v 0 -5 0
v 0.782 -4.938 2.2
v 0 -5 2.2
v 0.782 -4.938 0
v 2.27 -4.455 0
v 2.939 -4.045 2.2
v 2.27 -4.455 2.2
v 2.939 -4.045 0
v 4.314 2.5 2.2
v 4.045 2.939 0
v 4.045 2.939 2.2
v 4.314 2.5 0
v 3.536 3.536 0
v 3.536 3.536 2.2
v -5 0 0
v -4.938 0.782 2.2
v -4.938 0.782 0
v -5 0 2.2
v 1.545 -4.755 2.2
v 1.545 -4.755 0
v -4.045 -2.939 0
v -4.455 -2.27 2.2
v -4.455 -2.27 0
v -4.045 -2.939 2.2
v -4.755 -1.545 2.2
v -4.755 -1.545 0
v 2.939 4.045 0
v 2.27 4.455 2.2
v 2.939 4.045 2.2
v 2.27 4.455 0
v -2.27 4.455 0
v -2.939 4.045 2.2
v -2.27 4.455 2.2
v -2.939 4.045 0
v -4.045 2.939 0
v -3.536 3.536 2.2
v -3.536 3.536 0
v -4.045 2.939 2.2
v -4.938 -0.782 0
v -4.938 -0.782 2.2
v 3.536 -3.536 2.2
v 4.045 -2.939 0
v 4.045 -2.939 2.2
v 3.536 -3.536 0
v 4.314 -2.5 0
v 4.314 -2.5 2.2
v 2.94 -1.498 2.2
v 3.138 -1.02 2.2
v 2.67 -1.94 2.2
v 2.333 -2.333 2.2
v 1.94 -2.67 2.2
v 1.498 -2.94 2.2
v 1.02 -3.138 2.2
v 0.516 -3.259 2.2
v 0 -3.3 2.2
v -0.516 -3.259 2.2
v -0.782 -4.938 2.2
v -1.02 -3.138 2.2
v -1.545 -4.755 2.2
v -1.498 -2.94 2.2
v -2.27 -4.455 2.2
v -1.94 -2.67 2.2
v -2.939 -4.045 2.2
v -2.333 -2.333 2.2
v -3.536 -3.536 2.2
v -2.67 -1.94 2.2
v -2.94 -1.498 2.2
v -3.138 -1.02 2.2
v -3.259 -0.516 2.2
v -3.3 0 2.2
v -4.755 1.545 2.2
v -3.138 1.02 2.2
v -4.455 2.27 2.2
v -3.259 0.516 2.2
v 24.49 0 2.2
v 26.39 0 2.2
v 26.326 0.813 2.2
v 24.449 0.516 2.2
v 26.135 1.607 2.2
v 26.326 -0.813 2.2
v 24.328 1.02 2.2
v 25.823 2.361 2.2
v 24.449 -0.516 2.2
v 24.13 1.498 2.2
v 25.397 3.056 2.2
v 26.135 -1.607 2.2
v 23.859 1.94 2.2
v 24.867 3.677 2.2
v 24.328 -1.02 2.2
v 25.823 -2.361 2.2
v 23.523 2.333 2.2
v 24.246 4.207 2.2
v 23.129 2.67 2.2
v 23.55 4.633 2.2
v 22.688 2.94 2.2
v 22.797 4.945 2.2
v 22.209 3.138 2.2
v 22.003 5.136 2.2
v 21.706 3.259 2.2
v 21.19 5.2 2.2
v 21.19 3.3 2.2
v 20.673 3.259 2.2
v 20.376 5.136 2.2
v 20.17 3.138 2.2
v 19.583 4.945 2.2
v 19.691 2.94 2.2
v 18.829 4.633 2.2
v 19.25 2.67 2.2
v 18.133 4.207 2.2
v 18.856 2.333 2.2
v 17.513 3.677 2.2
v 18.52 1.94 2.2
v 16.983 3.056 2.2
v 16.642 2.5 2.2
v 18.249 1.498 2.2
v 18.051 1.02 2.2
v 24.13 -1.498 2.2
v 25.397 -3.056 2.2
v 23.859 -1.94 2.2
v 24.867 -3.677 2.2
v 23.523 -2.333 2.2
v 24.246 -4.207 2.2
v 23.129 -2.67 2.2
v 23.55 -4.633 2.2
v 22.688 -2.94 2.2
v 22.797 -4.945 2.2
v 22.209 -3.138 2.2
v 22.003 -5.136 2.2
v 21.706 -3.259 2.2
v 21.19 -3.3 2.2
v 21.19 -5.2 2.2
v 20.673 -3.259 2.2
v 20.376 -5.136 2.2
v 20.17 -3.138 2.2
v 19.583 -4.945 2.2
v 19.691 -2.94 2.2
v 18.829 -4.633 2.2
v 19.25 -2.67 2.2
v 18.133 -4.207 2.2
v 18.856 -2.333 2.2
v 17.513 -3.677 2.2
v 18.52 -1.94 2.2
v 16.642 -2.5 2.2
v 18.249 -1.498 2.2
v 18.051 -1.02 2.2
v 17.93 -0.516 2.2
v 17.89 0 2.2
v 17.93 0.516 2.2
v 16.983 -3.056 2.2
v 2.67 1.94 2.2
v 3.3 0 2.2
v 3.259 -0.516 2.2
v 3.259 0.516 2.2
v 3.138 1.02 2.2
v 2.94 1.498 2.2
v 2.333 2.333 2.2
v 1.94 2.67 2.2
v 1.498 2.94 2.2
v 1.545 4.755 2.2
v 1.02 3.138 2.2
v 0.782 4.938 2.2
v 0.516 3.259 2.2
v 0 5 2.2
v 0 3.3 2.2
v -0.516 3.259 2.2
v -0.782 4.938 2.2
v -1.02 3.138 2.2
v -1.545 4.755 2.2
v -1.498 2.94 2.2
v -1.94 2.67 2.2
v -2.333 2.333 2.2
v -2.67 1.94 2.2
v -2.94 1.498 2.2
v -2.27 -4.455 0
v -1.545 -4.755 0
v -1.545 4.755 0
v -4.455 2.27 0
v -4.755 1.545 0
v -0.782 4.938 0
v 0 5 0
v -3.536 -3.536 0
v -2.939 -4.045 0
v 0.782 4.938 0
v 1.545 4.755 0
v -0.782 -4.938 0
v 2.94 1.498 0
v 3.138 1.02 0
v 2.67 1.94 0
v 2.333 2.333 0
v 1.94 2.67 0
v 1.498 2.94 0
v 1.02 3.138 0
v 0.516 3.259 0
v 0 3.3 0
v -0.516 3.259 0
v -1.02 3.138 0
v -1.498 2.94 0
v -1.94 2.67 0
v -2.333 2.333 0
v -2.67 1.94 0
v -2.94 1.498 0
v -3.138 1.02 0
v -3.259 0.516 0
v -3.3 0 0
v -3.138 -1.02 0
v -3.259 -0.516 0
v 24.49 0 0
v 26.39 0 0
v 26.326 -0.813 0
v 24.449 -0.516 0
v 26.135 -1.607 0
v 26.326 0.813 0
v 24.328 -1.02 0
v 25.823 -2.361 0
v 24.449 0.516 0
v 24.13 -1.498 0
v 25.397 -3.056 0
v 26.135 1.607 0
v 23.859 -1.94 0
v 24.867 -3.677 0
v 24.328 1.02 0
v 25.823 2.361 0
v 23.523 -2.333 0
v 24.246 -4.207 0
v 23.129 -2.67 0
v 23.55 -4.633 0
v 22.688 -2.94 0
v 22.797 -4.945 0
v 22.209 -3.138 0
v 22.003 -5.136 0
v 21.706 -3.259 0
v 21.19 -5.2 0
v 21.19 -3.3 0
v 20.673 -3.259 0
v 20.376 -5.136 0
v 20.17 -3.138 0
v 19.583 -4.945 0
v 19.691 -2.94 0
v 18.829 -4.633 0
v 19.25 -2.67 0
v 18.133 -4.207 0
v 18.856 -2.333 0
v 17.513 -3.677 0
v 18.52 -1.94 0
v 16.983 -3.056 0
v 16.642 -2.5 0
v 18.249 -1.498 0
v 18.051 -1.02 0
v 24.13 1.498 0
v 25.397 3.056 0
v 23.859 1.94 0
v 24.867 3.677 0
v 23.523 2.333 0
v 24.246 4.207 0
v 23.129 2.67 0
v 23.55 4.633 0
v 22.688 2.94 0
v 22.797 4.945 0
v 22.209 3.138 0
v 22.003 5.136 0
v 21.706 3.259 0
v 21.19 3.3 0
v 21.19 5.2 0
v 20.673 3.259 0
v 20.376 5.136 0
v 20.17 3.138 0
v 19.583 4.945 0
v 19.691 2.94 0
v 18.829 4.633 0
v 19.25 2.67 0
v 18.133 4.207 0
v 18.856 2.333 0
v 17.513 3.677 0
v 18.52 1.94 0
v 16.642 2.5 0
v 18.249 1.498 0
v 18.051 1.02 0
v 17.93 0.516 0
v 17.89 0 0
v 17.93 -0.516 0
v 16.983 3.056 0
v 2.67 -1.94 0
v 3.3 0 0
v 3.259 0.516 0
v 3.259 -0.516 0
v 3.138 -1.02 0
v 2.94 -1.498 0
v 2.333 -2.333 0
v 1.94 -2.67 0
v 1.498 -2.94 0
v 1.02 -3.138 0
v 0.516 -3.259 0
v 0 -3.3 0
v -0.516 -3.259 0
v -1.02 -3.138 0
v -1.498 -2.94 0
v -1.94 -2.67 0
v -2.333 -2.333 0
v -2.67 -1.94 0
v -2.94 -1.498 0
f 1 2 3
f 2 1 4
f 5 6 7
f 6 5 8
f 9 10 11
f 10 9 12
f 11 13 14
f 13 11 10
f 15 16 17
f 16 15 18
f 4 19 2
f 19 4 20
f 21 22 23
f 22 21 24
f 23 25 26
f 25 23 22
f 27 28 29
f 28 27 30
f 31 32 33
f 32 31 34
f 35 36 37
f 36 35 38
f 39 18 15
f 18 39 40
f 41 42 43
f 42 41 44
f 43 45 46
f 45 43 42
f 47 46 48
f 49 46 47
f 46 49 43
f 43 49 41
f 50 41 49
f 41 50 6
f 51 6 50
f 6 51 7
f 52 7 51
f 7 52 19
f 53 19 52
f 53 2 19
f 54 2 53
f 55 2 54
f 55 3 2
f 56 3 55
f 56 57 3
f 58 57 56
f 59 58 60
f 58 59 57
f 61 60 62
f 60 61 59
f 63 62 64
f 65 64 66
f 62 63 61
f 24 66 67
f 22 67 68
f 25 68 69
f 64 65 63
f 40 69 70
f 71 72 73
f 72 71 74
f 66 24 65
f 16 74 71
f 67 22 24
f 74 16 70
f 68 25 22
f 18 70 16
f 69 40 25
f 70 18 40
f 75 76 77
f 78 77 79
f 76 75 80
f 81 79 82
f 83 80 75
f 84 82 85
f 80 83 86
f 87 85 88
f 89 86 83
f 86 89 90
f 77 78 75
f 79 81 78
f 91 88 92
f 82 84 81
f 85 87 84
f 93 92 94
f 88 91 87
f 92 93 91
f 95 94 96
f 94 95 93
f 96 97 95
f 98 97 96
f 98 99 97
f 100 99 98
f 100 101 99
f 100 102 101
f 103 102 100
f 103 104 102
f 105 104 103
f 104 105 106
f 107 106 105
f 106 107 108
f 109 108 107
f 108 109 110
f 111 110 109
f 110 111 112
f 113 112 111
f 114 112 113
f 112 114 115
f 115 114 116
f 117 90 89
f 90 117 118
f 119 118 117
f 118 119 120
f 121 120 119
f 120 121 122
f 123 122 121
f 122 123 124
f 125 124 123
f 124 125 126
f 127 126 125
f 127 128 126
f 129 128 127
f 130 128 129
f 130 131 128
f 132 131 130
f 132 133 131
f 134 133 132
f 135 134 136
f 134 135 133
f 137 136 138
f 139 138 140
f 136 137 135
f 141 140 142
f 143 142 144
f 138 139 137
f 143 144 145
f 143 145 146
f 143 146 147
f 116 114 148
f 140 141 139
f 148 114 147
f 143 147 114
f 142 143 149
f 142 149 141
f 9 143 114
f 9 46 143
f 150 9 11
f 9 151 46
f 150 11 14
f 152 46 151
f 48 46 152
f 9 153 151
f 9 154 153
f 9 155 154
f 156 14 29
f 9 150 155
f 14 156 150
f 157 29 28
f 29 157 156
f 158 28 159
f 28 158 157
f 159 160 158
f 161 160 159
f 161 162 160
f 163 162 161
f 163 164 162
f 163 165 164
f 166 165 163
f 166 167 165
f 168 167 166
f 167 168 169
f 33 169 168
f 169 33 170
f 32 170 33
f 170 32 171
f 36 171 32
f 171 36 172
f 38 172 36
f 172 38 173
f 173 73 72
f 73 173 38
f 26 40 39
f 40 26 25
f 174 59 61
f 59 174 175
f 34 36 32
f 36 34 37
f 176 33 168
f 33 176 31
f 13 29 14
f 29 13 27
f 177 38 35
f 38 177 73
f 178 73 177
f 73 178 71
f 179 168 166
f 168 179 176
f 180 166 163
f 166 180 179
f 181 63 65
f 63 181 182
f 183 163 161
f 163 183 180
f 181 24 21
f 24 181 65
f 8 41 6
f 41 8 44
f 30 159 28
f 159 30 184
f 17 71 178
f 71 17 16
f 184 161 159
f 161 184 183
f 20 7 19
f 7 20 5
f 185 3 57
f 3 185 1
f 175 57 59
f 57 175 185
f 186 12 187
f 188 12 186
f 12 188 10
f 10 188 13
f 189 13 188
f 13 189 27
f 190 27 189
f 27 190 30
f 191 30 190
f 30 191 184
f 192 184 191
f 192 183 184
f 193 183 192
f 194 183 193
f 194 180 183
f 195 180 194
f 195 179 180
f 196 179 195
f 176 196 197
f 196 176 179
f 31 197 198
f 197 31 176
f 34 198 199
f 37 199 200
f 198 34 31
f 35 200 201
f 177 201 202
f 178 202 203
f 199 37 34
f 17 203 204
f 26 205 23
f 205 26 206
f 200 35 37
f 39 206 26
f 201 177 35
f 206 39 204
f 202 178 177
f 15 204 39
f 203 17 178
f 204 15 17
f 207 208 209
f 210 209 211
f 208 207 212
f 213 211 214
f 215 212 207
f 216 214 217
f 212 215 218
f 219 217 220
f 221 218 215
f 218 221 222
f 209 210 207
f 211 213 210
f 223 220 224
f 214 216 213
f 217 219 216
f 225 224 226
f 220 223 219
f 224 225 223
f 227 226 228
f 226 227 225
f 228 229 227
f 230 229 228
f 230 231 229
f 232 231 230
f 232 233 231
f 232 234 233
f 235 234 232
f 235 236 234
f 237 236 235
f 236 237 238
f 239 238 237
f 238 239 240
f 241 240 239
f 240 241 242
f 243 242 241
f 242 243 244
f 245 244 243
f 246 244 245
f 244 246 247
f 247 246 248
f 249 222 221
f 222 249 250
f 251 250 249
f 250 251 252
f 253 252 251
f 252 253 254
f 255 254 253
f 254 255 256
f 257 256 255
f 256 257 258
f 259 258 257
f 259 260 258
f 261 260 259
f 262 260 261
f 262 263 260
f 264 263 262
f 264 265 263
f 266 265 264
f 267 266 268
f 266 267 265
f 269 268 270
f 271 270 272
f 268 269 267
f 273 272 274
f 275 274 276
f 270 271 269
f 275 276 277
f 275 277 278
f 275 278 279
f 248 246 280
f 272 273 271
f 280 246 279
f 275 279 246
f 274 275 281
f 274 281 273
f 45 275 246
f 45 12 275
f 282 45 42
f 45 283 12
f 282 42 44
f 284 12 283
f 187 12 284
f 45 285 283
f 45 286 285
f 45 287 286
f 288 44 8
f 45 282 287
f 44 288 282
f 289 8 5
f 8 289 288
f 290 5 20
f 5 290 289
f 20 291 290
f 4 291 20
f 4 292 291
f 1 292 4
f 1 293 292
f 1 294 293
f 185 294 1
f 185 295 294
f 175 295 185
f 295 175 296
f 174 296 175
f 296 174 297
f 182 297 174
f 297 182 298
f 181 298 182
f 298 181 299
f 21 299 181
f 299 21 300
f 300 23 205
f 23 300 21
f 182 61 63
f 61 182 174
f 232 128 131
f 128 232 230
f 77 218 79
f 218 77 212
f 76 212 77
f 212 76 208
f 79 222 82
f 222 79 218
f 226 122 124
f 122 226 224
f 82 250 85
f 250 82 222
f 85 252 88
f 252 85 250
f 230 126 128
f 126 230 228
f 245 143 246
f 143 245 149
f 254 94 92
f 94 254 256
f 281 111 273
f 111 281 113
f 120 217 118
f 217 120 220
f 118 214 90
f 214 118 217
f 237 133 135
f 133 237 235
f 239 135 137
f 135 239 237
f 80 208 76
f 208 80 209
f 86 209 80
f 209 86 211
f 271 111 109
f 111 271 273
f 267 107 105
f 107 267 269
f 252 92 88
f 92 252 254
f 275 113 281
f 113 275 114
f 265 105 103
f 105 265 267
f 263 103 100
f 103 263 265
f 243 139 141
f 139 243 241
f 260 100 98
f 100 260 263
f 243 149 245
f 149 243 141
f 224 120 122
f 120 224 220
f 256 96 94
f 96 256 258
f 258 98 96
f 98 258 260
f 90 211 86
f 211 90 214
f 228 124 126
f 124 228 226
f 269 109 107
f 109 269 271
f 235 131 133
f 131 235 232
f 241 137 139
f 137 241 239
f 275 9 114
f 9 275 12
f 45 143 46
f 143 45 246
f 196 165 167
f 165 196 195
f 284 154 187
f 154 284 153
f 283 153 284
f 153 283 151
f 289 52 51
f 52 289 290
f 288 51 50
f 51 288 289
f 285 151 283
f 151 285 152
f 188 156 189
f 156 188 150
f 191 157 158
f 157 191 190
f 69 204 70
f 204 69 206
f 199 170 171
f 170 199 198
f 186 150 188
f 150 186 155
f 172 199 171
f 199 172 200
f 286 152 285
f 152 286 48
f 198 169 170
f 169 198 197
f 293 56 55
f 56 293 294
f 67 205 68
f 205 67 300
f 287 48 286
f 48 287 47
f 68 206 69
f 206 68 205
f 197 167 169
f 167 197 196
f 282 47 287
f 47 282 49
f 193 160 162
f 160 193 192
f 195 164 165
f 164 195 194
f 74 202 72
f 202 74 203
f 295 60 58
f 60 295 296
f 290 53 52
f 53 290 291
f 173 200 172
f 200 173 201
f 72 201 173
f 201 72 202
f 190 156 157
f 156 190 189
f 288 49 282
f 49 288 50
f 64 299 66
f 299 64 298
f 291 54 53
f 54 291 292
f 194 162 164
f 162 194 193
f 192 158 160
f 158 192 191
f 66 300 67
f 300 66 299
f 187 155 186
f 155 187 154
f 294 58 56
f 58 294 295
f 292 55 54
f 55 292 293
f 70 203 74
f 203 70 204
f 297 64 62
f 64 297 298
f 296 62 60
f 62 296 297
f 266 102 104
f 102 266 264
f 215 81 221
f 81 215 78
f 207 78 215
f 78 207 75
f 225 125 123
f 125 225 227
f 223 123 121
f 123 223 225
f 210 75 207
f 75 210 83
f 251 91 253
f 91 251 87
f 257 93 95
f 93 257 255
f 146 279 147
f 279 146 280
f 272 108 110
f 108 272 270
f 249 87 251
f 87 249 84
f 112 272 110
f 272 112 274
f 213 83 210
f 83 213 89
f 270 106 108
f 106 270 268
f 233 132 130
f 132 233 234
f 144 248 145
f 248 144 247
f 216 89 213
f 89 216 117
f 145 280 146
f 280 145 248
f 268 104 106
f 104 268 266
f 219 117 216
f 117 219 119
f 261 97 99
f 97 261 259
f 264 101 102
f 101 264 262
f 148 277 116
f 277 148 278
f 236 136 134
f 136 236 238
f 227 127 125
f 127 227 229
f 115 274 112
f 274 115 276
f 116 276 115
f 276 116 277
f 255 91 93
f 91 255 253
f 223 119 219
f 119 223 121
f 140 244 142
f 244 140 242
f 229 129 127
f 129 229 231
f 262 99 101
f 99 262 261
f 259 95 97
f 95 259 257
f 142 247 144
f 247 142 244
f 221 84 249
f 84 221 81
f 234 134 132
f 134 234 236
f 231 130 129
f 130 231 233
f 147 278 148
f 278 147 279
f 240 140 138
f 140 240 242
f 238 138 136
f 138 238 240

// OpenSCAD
$fn=40;

gWT = 1.4;          // Wall thickness

Lift = 40;          // Amount the rows lift for each layer

// 8mm is the thinnest it can go or not enough room for hinges. This is
// enough for all except the first management row needs 11 mm.
CardThickness = 8;

PinDepth = 3.5;       // distance of Pins from edge
InOutPinDiff = Lift/2;  // From outgoing pin to incoming pin height
ConnLength  = sqrt((PinDepth*2)*(PinDepth*2) + InOutPinDiff*InOutPinDiff);

echo ("conn length = ",ConnLength);

CardStack = CardThickness+2*gWT;

if (CardStack < 10.4)
    echo(CardStack, "CARD THICKNESS TOO SMALL FOR HINGES");


// with sleeves and walls
CardW = 61+2*gWT;
CardH = 96;

CardsPerRow = 4;



module RCube(x,y,z,ipR=4) {
    translate([-x/2,-y/2,0]) hull(){
      translate([ipR,ipR,ipR]) sphere(ipR);
      translate([x-ipR,ipR,ipR]) sphere(ipR);
      translate([ipR,y-ipR,ipR]) sphere(ipR);
      translate([x-ipR,y-ipR,ipR]) sphere(ipR);
      translate([ipR,ipR,z-ipR]) sphere(ipR);
      translate([x-ipR,ipR,z-ipR]) sphere(ipR);
      translate([ipR,y-ipR,z-ipR]) sphere(ipR);
      translate([x-ipR,y-ipR,z-ipR]) sphere(ipR);
      }  
} 

module pin(h=10, r=4, lh=3, lt=1) {
  // h = shaft height
  // r = shaft radius
  // lh = lip height
  // lt = lip thickness

  difference() {
      union() {
        // shaft
        cylinder(h=h-lh, r=r, $fn=30);
        translate([0, 0, h-lh]) cylinder(h=lh*0.25, r1=r, r2=r+(lt/2), $fn=30);
        translate([0, 0, h-lh+lh*0.25]) cylinder(h=lh*0.25, r=r+(lt/2), $fn=30);    
        translate([0, 0, h-lh+lh*0.50]) cylinder(h=lh*0.50, r1=r+(lt/2), r2=r-(lt/2), $fn=30);    
      }
    
    // center cut
    translate([-r*0.5/2, -(r*2+lt*2)/2, h/4]) cube([r*0.5, r*2+lt*2, h]);
    translate([0, 0, h/4]) cylinder(h=h+lh, r=r/2.5, $fn=20);
  
    // side cuts
    translate([-r*2, -lt-r*1.125, -1]) cube([r*4, lt*2, h+2]);
    translate([-r*2, -lt+r*1.125, -1]) cube([r*4, lt*2, h+2]);
  }
}

module connector(){
    ConnThick = 2.2;
    
    difference(){
        union() {
           cylinder(r1=5,r2=5,h=ConnThick);
           translate([ConnLength,0,0]) cylinder(r1=5.2,r2=5.2,   h=ConnThick);
           translate([ConnLength/2,0,ConnThick/2])cube([ConnLength,5,ConnThick],center=true);
        }
        
       // drill the 2 holes (was 3.4 trying 3.3)
       translate([0,0,1])          cylinder(h=4, r=3.3, center =true);
       translate([ConnLength,0,1]) cylinder(h=4, r=3.3, center =true);
    }

}

module CardBox (width,thick,height){ 
      difference() {
        // create base box and hallow it out
        cube ([width,thick,height], center=true);
        translate([0,0,gWT]) cube ([width-2*gWT,thick-2*gWT,height], center=true);

        // Top access to grab card
        translate([0,0,height/2-20]) RCube(width-10,100,100,15); 
        
         // Access to see Milstone text, 2 strectched cylinders hulled
        hull(){
            translate([0,10,5]) scale([1,1,0.7])
                 rotate([90,0,0])cylinder(h=40,r=(width/2)-10,center=true);
            translate([0,10,-30]) scale([1,1,0.5])
                 rotate([90,0,0])cylinder(h=40,r=(width/2)-10,center=true);
        }
        
    }
}

module CardRow(Type="Middle")
{
    TopPinOffset = 6;   // top pin from top edge
    BotPinOffset = 6;   // bottom pin from bottom edge
    // middle pin is always from center

    difference(){
        union(){
           for (slot=[0:CardsPerRow-1])
               translate([CardW/2+CardW*slot-(gWT/2)*slot,0,0]) CardBox(CardW,CardStack,CardH);  
        }        
    }
    
    // Outgoing Pins for next row  Not needed for last row
    if (Type != "Last"){
        // TopOutPinLeft   10 mm from top , 5 mm from edge
        translate([CardW*CardsPerRow-(gWT/2)*(CardsPerRow-1),-CardStack/2 + PinDepth,CardH/2-TopPinOffset])rotate([90,0,90])
              pin(h=5, r=3, lh=3, lt=1);
        // MidOutPinLeft middle line so raise by half of InOutPinDiff
        translate([CardW*CardsPerRow-(gWT/2)*(CardsPerRow-1),-CardStack/2 + PinDepth, InOutPinDiff/2])rotate([90,0,90])
              pin(h=5, r=3, lh=3, lt=1);
        // BotOutPinLeft  match is 10mm from bot so this is 10mm + InOutPinDiff
        translate([CardW*CardsPerRow-(gWT/2)*(CardsPerRow-1),-CardStack/2 + PinDepth, -CardH/2+BotPinOffset+InOutPinDiff])rotate([90,0,90])
              pin(h=5, r=3, lh=3, lt=1);
            
        // TopOutPinRight  10 mm from top
        translate([0,-CardStack/2 + PinDepth,CardH/2-TopPinOffset])rotate([90,0,-90])
              pin(h=5, r=3, lh=3, lt=1);
        // MidOutPinRight middle line so raise by half of InOutPinDiff
        translate([0,-CardStack/2 + PinDepth, InOutPinDiff/2])rotate([90,0,-90])
              pin(h=5, r=3, lh=3, lt=1);
        // BotOutPinRight  match is 10mm from bot so this is 10mm + InOutPinDiff
        translate([0,-CardStack/2 + PinDepth, -CardH/2+BotPinOffset+InOutPinDiff])rotate([90,0,-90])
              pin(h=5, r=3, lh=3, lt=1);        
        
    }
    
        // incoming Pins for next row  3 pins per not for first row
    if (Type != "First") {
        // TopInPinLeft   10 + InOutPinDiff mm from top
        translate([CardW*CardsPerRow-(gWT/2)*(CardsPerRow-1), CardStack/2 - PinDepth,CardH/2-TopPinOffset-InOutPinDiff])rotate([90,0,90])
              pin(h=5, r=3, lh=3, lt=1);
        // MidInPinLeft middle line so raise by half of InOutPinDiff
        translate([CardW*CardsPerRow-(gWT/2)*(CardsPerRow-1), CardStack/2 - PinDepth, -InOutPinDiff/2])rotate([90,0,90])
              pin(h=5, r=3, lh=3, lt=1);
        // BotInPinLeft  10mm from bottom
        translate([CardW*CardsPerRow-(gWT/2)*(CardsPerRow-1), CardStack/2 - PinDepth, -CardH/2+BotPinOffset])rotate([90,0,90])
              pin(h=5, r=3, lh=3, lt=1);
        // TopInPinRight  10 mm from top
        translate([0,CardStack/2 - PinDepth,CardH/2-TopPinOffset-InOutPinDiff])rotate([90,0,-90])
              pin(h=5, r=3, lh=3, lt=1);
        // MidInPinRight middle line so raise by half of InOutPinDiff
        translate([0,CardStack/2 - PinDepth, -InOutPinDiff/2])rotate([90,0,-90])
              pin(h=5, r=3, lh=3, lt=1);
        // BotInPinRight  match is 10mm from bot so this is 10mm + InOutPinDiff
        translate([0,CardStack/2 - PinDepth, -CardH/2+BotPinOffset])rotate([90,0,-90])
              pin(h=5, r=3, lh=3, lt=1);             
    }    
        
}



//CardRow("First");
//CardRow("Middle");
//CardRow("Last");

connector();

//rotate([65,0,0]) CardRow(3);        
